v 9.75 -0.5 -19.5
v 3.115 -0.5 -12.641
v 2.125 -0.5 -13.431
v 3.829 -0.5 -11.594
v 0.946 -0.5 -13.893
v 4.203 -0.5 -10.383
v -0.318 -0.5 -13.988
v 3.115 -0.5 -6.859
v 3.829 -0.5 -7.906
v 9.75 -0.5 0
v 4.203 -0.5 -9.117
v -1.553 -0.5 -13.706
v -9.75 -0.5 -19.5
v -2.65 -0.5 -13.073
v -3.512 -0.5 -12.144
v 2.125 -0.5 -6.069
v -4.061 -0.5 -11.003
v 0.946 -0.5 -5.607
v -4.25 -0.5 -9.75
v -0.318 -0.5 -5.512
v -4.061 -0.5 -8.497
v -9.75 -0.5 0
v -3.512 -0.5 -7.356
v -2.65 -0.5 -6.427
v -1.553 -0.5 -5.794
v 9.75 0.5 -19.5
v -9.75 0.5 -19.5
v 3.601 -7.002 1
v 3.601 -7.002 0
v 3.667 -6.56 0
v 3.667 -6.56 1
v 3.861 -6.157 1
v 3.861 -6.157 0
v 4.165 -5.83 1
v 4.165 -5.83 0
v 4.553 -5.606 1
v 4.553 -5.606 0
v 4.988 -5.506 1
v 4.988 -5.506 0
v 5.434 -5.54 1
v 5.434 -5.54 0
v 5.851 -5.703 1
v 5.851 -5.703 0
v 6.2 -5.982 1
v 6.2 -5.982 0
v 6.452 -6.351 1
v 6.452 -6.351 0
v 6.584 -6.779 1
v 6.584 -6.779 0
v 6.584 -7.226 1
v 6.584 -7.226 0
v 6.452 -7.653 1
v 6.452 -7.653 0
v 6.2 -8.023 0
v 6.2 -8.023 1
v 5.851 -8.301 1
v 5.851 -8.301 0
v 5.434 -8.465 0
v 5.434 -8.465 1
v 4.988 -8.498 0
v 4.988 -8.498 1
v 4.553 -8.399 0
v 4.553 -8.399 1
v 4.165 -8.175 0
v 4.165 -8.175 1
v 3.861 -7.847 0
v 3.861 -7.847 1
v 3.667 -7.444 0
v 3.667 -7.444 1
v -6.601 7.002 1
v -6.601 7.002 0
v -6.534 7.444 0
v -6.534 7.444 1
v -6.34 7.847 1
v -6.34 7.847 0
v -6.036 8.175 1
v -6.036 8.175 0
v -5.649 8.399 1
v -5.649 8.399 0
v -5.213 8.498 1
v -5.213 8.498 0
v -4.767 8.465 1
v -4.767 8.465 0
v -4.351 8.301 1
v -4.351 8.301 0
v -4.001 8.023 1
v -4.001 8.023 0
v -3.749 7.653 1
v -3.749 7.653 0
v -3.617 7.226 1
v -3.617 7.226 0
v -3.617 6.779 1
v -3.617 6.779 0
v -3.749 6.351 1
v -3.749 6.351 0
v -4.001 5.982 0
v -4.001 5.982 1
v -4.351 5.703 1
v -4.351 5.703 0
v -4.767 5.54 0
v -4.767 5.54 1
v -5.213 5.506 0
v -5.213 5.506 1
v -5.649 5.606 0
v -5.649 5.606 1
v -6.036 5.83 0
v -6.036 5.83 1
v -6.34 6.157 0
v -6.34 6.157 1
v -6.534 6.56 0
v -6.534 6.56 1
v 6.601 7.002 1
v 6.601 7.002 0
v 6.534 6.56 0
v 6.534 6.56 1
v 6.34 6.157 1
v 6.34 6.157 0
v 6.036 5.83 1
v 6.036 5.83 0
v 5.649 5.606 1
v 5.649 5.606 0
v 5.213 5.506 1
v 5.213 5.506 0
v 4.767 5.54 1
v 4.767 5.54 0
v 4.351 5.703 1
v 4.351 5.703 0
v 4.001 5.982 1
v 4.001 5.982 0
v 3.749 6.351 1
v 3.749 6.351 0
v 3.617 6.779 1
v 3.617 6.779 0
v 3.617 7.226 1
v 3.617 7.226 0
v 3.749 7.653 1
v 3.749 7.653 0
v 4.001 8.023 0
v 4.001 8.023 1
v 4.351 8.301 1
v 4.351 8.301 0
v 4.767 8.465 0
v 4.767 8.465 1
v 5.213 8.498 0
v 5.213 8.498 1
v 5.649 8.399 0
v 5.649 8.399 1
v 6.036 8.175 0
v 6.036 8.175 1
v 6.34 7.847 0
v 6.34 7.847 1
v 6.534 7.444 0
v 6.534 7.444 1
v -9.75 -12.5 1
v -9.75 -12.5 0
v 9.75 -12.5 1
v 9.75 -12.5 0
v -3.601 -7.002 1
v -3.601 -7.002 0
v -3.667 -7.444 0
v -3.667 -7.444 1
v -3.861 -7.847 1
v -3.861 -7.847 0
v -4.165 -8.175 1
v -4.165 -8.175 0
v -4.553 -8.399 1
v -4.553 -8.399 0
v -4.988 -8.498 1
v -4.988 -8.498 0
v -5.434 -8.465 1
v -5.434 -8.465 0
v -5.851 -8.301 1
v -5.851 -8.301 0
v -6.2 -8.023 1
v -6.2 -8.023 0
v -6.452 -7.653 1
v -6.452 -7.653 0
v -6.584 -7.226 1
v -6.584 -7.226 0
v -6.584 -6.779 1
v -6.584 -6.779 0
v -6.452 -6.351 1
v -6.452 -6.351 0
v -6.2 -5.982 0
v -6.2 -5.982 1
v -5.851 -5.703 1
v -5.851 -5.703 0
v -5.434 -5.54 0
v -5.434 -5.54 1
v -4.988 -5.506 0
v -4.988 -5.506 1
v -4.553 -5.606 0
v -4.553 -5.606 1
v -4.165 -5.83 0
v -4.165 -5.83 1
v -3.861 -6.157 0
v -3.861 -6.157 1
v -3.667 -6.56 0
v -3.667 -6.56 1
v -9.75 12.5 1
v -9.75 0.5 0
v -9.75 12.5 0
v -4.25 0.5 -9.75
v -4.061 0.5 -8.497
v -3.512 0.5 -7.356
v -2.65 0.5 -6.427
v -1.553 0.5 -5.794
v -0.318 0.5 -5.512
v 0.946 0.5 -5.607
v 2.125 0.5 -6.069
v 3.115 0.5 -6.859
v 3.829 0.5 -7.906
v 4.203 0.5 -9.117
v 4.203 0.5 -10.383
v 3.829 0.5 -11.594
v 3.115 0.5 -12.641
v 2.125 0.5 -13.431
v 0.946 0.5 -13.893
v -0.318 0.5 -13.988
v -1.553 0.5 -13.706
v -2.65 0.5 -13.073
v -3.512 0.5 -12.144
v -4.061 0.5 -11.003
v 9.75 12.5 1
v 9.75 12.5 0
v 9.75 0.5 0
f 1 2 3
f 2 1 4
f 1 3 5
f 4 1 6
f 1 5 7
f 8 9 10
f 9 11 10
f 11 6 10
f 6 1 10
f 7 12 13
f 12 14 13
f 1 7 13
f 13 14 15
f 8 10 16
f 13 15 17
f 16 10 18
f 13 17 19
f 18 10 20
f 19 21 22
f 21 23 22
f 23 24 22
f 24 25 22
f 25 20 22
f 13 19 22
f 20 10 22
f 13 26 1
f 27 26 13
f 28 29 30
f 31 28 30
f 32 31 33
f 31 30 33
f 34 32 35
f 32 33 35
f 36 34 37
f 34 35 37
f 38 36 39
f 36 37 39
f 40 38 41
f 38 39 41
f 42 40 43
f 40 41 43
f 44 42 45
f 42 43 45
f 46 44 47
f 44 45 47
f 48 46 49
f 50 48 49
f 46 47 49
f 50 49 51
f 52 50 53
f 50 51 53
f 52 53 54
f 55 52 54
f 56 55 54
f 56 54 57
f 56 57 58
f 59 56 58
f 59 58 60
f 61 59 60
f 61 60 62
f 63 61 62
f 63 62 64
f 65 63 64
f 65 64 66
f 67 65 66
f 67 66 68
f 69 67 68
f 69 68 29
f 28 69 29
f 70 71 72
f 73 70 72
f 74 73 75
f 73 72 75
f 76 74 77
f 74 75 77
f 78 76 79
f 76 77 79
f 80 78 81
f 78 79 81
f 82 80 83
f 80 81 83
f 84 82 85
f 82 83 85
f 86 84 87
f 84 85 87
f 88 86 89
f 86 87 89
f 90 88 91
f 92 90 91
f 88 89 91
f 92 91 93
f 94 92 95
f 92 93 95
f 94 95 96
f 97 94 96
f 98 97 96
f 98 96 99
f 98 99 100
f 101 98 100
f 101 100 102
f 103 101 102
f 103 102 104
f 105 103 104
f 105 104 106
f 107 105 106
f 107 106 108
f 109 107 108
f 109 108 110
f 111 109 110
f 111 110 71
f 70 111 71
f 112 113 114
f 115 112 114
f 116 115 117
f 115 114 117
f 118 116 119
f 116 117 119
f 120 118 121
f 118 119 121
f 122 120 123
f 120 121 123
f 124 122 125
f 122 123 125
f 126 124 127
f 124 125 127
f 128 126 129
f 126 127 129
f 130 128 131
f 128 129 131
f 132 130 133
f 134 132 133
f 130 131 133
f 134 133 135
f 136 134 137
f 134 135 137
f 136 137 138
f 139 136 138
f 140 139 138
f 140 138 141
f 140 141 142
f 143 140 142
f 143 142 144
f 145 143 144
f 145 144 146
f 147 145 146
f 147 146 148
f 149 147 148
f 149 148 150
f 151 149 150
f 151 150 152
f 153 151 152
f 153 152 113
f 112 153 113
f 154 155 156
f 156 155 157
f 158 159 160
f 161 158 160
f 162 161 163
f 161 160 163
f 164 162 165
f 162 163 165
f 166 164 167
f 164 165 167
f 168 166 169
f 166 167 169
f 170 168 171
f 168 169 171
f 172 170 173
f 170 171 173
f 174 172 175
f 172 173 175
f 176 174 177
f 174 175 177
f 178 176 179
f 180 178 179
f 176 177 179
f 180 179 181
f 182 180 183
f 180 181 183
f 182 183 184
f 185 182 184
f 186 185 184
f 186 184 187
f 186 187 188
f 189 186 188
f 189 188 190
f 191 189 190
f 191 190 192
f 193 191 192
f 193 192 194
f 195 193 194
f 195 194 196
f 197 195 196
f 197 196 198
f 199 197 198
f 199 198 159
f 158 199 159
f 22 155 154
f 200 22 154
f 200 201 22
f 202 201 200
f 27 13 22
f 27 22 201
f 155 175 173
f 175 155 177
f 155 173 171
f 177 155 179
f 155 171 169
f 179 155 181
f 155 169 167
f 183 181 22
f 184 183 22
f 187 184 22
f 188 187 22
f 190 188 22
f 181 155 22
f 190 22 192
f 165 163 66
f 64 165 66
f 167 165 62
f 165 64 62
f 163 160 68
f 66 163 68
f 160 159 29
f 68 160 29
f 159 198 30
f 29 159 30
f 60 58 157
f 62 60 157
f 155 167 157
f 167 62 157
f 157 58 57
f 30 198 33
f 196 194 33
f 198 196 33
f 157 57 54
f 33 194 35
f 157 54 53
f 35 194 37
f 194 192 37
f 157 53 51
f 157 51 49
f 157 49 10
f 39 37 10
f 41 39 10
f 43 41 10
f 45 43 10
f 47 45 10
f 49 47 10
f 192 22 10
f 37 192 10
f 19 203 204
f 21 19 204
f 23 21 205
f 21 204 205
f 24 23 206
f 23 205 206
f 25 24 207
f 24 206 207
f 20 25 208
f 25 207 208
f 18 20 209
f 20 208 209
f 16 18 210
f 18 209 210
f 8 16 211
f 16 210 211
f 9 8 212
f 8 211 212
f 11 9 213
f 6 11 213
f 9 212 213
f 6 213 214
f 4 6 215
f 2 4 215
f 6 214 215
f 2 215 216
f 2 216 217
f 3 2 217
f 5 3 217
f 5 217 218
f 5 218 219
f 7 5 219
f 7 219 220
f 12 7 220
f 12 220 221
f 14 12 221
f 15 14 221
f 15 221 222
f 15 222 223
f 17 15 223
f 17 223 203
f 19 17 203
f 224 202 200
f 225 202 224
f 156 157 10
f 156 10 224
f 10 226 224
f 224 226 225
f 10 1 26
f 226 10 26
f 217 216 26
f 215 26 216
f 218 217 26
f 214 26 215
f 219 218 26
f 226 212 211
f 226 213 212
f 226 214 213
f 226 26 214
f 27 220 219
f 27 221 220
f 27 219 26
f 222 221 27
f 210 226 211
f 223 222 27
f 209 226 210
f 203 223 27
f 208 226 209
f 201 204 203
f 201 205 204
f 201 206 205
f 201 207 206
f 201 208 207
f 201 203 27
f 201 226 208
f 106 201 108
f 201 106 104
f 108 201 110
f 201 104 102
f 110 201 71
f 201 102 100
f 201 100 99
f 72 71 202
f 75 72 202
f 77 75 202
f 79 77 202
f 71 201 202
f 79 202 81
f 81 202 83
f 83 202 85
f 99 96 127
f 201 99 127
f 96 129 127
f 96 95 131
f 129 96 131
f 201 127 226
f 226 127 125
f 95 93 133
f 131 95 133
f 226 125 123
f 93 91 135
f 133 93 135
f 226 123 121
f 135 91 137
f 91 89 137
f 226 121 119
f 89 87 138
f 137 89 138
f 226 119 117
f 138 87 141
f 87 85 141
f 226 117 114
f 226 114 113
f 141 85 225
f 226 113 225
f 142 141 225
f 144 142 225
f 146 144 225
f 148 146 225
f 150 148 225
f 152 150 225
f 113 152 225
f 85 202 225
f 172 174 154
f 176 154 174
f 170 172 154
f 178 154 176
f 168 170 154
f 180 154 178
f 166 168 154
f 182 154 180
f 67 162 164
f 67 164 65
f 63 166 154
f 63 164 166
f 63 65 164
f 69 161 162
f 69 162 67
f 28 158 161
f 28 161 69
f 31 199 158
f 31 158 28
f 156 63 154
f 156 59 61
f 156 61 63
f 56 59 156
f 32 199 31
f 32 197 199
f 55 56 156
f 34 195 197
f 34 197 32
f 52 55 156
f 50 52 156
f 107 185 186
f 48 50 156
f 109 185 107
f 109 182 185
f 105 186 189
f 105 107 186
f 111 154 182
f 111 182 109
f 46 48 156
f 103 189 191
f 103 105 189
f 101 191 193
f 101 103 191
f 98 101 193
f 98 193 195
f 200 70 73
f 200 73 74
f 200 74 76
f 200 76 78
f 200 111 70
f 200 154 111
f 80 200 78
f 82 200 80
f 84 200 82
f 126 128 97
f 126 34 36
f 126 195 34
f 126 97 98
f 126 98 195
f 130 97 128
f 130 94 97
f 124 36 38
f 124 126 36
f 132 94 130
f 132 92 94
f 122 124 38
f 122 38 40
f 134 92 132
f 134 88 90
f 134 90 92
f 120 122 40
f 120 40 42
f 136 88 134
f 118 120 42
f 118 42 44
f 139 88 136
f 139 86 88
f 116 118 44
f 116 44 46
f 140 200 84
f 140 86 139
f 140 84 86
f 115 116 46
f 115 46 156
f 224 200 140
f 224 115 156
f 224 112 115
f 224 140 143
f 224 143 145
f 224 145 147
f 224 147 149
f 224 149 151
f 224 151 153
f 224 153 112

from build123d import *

# Parameters (mm, degrees)
SKETCH_1_W          = 19.5
SKETCH_1_H          = 25
EXTRUDE_1_DEPTH     = 1
SKETCH_2_W          = 19.5
SKETCH_2_H          = 1
EXTRUDE_2_DEPTH     = 19.5
SKETCH_3_R          = 1.5
CUT_EXTRUDE_1_DEPTH = 26.130907266
SKETCH_4_R          = 4.25
CUT_EXTRUDE_2_DEPTH = 26.383311447


with BuildPart() as part:
    # 草图1 → 凸台-拉伸1 (new body)
    with BuildSketch(Plane.XY):
        Rectangle(SKETCH_1_W, SKETCH_1_H)
    extrude(amount=EXTRUDE_1_DEPTH)

    # 草图2 → 凸台-拉伸2 (add)
    with BuildSketch(Plane(origin=(0, 0, 0), x_dir=(-1, 0, 0), z_dir=(0, 0, -1))):
        Rectangle(SKETCH_2_W, SKETCH_2_H)
    extrude(amount=EXTRUDE_2_DEPTH)

    # 草图3 → 切除-拉伸1 (cut, through all)
    with BuildSketch(Plane(origin=(0, 0, 0), x_dir=(-1, 0, 0), z_dir=(0, 0, -1))):
        with Locations((5.100590272, 7.002287459)):
            Circle(SKETCH_3_R)
        with Locations(Location((-5.100590272, 7.002287459, 0), (0, 0, 180))):
            Circle(SKETCH_3_R)
        with Locations(Location((5.100590272, -7.002287459, 0), (0, 0, 180))):
            Circle(SKETCH_3_R)
        with Locations((-5.100590272, -7.002287459)):
            Circle(SKETCH_3_R)
    extrude(amount=-CUT_EXTRUDE_1_DEPTH, mode=Mode.SUBTRACT)

    # 草图4 → 切除-拉伸2 (cut, through all)
    with BuildSketch(Plane(origin=(0, 0.5, 0), x_dir=(1, 0, 0), z_dir=(0, 1, 0))):
        with Locations(Location((0, 9.75, 0), (0, 0, 180))):
            Circle(SKETCH_4_R)
    extrude(amount=-CUT_EXTRUDE_2_DEPTH, mode=Mode.SUBTRACT)


solid = part.part
